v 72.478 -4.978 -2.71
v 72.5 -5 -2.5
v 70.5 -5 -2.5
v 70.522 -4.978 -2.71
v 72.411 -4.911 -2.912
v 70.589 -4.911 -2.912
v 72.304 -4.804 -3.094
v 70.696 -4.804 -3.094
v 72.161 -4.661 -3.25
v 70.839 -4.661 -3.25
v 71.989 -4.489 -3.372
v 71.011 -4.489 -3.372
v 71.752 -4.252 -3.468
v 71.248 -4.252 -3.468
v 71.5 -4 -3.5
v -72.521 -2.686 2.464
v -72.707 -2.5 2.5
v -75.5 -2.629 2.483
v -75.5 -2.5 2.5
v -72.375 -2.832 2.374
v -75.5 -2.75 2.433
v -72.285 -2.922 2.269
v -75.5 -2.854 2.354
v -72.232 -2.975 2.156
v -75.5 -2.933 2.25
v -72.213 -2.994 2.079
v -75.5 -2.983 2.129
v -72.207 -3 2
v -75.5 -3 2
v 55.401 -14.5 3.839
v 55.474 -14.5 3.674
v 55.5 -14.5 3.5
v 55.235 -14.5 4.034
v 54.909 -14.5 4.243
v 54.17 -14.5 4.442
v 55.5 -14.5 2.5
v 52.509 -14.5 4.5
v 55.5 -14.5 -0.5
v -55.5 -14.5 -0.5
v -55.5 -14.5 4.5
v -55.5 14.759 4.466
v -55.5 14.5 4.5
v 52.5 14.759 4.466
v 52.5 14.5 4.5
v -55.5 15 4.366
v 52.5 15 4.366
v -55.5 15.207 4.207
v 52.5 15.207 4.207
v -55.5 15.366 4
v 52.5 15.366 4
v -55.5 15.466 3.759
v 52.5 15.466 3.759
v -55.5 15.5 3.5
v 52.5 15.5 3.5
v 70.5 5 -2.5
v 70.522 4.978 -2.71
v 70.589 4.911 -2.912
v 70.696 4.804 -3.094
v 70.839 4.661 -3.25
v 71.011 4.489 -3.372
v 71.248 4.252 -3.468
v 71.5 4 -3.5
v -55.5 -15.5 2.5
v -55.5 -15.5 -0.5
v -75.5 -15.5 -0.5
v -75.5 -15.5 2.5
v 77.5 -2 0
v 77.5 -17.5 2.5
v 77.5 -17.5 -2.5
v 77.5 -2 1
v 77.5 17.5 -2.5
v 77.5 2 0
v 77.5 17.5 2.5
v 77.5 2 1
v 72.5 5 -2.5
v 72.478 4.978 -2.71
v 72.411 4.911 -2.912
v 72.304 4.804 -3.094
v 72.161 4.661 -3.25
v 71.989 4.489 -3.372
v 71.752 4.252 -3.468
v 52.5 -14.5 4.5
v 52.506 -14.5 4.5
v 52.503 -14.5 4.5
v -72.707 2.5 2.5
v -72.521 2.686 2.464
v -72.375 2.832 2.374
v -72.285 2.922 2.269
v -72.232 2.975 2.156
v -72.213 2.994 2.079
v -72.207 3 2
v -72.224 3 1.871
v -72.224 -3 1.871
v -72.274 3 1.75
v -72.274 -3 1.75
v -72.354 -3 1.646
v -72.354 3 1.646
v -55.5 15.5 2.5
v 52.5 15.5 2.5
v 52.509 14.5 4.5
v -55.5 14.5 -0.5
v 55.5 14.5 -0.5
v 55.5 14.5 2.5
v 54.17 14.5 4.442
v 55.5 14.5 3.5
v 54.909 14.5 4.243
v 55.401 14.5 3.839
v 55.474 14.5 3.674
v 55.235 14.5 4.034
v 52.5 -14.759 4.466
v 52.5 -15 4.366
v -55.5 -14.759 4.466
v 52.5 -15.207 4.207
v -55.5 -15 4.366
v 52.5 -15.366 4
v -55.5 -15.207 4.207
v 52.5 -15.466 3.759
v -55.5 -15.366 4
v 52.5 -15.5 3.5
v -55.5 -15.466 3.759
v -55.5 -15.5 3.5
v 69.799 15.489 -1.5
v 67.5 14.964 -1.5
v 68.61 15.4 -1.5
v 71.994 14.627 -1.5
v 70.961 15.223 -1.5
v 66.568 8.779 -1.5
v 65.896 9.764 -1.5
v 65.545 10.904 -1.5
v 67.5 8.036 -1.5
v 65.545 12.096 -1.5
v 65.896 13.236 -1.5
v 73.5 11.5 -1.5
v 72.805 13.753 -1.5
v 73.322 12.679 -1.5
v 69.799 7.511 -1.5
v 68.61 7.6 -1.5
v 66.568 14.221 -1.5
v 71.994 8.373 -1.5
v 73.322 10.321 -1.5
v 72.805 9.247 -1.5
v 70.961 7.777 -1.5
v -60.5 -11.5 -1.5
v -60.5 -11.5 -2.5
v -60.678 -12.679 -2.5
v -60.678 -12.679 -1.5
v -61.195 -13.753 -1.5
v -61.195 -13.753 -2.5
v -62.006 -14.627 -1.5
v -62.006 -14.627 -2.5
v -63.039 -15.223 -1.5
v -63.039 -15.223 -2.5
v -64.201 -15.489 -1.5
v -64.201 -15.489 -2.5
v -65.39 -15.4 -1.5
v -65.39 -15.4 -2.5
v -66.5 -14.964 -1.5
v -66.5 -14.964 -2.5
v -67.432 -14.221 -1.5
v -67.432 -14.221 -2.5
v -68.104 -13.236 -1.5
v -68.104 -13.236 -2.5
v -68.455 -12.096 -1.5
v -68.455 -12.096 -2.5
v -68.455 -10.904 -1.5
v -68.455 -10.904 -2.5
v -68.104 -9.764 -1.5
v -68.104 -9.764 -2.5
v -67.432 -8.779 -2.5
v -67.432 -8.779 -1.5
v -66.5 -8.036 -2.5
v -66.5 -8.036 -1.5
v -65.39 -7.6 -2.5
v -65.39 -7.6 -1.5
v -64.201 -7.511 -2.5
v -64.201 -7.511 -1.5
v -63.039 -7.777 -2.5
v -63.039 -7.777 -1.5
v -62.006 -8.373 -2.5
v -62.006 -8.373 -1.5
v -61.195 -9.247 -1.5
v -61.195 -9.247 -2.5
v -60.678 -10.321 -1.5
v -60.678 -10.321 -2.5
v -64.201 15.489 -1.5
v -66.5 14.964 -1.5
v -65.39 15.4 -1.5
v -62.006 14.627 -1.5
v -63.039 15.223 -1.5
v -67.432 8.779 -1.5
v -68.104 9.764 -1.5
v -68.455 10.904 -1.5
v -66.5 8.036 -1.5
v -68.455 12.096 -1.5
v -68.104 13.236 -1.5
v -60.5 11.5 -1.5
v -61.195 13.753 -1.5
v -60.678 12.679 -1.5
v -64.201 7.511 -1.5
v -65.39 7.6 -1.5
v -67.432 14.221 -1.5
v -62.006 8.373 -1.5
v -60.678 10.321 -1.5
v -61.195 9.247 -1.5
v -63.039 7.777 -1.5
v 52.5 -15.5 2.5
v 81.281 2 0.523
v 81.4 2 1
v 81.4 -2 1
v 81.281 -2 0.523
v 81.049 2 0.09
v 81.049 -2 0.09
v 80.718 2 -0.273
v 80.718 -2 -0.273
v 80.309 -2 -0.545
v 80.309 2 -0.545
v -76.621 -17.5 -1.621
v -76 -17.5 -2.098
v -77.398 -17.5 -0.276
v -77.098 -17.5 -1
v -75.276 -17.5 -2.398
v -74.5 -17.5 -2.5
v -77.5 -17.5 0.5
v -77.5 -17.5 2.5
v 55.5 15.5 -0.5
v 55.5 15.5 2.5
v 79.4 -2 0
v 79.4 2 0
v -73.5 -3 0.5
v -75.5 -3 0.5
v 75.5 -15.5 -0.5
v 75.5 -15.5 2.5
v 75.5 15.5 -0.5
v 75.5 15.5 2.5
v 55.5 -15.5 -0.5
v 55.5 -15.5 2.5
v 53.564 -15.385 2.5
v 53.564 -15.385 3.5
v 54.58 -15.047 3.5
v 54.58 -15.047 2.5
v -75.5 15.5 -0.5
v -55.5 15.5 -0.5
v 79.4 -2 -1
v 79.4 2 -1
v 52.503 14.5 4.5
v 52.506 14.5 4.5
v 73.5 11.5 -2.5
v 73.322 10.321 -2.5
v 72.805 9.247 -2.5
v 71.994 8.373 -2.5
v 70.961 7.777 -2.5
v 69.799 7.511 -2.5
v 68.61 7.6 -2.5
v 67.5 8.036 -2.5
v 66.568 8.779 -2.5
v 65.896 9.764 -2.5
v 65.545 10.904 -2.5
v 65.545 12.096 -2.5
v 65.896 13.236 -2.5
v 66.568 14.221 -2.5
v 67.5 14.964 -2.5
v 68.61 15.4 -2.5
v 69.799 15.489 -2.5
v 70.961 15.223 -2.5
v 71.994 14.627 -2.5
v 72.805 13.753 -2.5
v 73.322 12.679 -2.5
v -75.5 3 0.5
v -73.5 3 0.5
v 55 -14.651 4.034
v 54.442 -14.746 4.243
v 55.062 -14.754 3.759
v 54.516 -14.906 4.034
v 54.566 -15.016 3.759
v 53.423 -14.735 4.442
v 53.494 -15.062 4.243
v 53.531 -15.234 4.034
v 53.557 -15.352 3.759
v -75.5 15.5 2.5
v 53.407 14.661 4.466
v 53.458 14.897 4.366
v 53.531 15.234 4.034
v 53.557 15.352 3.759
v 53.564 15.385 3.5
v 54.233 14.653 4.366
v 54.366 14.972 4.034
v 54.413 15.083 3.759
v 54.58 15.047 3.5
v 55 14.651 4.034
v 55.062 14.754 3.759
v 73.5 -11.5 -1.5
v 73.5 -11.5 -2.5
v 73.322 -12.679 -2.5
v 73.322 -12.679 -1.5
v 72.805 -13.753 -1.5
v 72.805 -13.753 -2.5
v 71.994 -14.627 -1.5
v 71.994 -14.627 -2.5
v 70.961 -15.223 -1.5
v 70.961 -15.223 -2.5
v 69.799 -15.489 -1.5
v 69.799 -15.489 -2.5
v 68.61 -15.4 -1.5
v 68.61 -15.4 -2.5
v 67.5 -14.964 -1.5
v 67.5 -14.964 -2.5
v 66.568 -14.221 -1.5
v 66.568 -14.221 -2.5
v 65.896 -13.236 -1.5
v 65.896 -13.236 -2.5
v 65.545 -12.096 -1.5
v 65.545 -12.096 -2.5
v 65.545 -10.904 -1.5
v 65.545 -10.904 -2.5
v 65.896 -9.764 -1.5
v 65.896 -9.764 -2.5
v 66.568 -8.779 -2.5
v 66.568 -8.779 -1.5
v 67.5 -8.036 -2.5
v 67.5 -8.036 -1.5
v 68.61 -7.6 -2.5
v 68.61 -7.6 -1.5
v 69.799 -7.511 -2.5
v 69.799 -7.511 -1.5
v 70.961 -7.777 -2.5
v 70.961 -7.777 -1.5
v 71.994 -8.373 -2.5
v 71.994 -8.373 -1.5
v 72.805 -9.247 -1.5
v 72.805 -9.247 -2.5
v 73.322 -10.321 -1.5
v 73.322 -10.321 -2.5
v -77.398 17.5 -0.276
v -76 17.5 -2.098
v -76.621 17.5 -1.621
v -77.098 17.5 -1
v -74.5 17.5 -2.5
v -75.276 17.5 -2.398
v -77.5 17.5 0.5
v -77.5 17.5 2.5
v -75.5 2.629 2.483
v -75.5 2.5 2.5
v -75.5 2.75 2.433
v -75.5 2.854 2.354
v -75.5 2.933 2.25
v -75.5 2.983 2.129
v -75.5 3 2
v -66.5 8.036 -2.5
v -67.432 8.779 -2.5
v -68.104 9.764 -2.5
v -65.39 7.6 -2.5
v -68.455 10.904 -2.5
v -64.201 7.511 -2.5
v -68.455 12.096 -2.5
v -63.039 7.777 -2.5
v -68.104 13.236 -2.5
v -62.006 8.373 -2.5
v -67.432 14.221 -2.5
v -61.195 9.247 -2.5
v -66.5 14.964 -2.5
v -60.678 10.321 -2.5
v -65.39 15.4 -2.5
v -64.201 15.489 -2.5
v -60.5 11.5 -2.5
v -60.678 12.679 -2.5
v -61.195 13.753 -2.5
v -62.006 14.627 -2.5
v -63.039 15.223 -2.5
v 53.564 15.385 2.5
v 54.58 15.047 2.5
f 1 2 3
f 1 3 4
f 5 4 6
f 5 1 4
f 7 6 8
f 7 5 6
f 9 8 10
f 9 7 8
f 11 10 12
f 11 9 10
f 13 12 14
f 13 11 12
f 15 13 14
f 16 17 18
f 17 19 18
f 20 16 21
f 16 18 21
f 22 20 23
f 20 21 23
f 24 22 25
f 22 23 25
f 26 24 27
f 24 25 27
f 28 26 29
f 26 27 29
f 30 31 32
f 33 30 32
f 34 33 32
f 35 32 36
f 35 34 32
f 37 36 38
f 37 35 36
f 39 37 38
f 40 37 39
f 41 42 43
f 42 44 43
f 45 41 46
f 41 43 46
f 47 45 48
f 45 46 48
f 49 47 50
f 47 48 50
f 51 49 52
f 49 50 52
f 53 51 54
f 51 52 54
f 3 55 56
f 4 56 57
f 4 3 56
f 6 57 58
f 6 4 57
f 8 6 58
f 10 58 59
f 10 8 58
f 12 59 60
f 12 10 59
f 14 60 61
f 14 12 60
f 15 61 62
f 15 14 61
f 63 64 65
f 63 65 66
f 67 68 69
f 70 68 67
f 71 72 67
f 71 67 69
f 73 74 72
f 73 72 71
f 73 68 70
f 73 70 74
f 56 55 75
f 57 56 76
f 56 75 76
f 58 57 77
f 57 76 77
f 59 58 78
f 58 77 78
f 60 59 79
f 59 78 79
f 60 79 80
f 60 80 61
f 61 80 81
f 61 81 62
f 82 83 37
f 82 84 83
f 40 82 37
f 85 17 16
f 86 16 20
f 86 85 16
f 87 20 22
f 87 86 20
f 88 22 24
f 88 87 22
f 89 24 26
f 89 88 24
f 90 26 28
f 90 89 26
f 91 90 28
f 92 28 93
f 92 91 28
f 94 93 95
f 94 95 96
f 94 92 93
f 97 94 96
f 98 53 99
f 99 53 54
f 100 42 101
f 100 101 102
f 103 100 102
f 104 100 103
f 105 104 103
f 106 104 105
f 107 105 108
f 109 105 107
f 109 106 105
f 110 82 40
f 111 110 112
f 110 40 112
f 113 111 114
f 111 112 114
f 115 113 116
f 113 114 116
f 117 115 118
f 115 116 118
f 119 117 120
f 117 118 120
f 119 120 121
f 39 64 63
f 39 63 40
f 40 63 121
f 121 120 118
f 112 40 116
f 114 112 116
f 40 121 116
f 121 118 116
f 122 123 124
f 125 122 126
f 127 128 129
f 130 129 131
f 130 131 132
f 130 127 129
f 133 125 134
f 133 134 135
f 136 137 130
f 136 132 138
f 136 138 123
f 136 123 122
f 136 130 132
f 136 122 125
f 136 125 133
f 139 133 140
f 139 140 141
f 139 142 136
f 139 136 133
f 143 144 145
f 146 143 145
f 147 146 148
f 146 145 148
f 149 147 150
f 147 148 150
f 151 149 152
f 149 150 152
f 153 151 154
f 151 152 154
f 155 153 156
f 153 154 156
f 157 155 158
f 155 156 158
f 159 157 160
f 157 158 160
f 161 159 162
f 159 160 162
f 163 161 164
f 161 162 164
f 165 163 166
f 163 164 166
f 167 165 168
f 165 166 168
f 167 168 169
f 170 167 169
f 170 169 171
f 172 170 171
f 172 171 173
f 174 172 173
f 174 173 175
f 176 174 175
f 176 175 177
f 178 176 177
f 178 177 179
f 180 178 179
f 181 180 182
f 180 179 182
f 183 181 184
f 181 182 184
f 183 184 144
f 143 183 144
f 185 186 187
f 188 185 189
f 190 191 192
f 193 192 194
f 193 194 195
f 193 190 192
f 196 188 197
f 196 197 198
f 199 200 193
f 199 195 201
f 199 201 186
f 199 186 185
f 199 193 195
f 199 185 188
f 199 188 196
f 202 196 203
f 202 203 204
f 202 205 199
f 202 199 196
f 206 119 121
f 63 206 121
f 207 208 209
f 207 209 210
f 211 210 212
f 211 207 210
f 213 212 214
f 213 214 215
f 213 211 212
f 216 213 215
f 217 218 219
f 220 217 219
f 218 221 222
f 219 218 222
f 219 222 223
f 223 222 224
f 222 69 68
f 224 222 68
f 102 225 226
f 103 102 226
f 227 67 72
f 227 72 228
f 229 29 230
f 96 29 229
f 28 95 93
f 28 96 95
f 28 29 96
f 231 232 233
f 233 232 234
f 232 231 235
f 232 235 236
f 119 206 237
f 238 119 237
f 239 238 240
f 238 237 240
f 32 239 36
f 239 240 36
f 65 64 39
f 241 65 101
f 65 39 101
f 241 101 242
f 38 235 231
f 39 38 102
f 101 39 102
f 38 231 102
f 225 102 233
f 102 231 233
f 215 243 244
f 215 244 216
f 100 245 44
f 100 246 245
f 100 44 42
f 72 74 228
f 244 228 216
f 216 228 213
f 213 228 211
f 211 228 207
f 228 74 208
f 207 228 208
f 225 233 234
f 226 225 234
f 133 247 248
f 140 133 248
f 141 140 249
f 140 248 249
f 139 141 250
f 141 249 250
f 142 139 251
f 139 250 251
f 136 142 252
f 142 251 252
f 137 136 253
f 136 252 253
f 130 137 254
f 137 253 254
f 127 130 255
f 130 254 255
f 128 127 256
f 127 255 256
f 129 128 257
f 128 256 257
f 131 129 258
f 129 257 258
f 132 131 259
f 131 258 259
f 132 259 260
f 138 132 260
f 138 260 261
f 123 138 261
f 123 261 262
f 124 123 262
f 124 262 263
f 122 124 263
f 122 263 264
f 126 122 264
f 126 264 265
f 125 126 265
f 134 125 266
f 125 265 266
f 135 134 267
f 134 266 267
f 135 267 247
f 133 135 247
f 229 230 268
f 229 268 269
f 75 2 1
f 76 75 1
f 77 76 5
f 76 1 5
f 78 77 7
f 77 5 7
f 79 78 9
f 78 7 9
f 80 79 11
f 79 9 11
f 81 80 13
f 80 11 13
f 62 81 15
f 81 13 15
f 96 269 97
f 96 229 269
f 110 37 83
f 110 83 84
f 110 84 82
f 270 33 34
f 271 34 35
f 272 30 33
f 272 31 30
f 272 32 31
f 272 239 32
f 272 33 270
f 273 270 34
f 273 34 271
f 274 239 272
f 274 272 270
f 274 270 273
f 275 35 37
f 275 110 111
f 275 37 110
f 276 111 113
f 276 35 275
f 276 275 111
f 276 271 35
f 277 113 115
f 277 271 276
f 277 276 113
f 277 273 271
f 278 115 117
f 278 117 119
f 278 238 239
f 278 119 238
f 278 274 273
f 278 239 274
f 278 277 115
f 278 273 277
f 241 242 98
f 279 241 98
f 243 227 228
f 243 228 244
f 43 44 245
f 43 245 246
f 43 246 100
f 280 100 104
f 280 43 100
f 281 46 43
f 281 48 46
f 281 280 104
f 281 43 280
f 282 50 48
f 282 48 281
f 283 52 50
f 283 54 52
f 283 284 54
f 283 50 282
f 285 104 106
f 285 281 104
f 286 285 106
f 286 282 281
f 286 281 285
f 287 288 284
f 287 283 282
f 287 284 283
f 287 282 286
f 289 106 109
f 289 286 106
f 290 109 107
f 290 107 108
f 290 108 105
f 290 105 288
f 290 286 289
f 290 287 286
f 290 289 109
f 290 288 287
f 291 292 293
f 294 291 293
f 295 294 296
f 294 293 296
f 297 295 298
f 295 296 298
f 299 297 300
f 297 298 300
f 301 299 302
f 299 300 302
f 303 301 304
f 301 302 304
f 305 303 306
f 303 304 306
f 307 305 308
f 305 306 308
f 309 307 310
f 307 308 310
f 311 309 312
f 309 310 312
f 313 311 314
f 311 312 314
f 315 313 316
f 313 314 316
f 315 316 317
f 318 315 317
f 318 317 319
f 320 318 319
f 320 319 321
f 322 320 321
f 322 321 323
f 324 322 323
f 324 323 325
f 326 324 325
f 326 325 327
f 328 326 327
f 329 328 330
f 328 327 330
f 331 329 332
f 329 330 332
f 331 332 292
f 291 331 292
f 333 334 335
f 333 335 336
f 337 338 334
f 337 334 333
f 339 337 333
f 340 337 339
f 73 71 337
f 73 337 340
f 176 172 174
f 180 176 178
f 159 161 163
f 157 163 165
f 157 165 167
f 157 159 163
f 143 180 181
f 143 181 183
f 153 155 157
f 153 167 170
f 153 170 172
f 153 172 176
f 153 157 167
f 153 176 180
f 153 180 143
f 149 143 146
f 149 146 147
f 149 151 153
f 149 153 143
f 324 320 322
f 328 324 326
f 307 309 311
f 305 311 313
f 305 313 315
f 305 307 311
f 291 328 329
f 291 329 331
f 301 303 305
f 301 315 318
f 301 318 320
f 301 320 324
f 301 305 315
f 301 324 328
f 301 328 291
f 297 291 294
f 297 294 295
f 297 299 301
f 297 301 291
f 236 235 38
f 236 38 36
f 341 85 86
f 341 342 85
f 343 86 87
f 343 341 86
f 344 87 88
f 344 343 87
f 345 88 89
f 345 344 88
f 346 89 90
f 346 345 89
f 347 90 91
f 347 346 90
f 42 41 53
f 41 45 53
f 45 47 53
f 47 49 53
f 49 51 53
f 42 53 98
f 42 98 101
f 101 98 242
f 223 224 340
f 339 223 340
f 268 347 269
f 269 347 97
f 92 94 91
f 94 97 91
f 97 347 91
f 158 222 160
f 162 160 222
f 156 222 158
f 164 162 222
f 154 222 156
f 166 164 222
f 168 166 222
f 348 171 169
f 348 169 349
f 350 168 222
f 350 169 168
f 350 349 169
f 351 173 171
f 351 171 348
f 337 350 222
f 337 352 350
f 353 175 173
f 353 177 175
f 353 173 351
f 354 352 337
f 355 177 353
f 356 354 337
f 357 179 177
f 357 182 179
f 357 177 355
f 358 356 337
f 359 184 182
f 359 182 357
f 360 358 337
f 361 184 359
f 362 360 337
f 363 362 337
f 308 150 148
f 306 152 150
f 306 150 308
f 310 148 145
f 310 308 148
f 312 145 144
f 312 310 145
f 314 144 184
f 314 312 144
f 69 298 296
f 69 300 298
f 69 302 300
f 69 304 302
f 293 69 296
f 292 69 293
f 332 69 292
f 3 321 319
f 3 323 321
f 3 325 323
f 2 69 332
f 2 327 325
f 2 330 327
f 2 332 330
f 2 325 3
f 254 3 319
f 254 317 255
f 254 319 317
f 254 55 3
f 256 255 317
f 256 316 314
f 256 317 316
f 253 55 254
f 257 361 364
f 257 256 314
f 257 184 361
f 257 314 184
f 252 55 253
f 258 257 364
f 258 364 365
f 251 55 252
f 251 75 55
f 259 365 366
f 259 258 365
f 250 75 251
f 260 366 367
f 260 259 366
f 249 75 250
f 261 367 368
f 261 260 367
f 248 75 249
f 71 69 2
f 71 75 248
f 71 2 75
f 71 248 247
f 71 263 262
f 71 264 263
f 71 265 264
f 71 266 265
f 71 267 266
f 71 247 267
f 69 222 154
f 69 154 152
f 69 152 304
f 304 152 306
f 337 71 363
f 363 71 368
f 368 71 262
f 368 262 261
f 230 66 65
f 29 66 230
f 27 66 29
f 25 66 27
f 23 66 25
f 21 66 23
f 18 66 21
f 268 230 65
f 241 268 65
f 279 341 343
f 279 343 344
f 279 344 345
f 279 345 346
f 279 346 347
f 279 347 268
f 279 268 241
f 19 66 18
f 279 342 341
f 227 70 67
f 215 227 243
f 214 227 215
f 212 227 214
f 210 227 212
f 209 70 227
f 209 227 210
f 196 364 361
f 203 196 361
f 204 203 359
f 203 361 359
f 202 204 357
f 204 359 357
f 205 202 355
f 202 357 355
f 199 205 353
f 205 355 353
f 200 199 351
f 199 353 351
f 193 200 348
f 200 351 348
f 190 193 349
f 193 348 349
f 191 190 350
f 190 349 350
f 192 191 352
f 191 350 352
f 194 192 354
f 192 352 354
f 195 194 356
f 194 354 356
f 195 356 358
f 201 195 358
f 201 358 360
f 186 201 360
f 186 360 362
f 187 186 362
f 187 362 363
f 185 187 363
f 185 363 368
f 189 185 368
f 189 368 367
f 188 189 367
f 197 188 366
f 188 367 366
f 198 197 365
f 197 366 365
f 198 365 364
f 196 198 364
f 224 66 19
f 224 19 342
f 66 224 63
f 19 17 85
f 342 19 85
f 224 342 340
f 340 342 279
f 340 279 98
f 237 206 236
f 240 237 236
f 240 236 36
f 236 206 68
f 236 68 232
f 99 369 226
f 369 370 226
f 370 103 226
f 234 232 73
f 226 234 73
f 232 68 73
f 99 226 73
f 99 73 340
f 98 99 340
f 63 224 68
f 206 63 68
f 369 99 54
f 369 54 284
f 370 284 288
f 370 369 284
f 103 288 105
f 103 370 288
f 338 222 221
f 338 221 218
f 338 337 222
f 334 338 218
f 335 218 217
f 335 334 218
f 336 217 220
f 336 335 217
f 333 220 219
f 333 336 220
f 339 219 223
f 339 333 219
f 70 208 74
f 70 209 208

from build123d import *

# Parameters (mm, degrees)
F0_W         = 35
F0_H         = 5
F1_DEPTH     = 77.5
F2_T         = -2
F4_DEPTH     = 3
F6_DEPTH     = 2
F7_T1_DEPTH  = 10.0971618345
F8_W         = 111
F8_H         = 5
F9_DEPTH     = 1
F10_W        = 111
F10_H        = 2
F10_H_2      = 3
F11_DEPTH    = 1
F12_T1_DEPTH = 9.5
F13_R        = 0.99999
F14_R        = 0.5
F15_R        = 4
F16_DEPTH    = 1
F17_W        = 2
F17_H        = 10
F18_DEPTH    = 1
F19_R        = 0.99999
F20_R        = 3


# Not quite as in the source:
# - a fillet or chamfer that OpenCascade refuses, or shapes differently, is made with other operations: its cross-section is extruded or revolved along the edge and cut away or added
# - a fillet or chamfer is up to 0.001 mm smaller than in the source, because OpenCascade refuses the exact size


with BuildPart() as f1:
    # F0 (on Right) → F1 (new body, symmetric)
    with BuildSketch(Plane.YZ):
        Rectangle(F0_W, F0_H)
    extrude(amount=F1_DEPTH, both=True)

    # F2
    f2_openings = [f1.faces().sort_by_distance(p)[0] for p in [
        (0, 0, 2.5),
    ]]
    offset(amount=F2_T, openings=f2_openings)

    # F3 (on Front) → F4 (join, symmetric)
    with BuildSketch(Plane.XZ):
        Polygon((-71.5, 2.5), (-75.5, 2.5), (-75.5, 0.5), (-73.5, 0.5), align=None)
    extrude(amount=F4_DEPTH, both=True)

    # F5 (on Front) → F6 (join, symmetric)
    with BuildSketch(Plane.XZ):
        Polygon((81.4, 1), (77.5, 1), (77.5, 0), (79.4, 0), (81.4, 0), align=None)
        Polygon((79.4, -1), (81.4, 0), (79.4, 0), align=None)
    extrude(amount=F6_DEPTH, both=True)

    # F7: fillet of radius 2 on 1 edges, made by hand

    # F7_s2 → F7_t1 (cut)
    with BuildSketch(Plane.XZ.offset(-5.0485809173)):
        with BuildLine():
            ThreePointArc((81.4, 1), (81.0488845703, 0.09023972), (80.3093065335, -0.5453467333))
            Line((80.3093065335, -0.5453467333), (81.4, 0))
            Line((81.4, 0), (81.4, 1))
        make_face()
    extrude(amount=F7_T1_DEPTH, mode=Mode.SUBTRACT)

    # F8 (on face) → F9 (join)
    with BuildSketch(Plane(origin=(0, -15.5, 0), x_dir=(-1, 0, 0), z_dir=(0, 1, 0))):
        with Locations((0, 2)):
            Rectangle(F8_W, F8_H)
    extrude(amount=F9_DEPTH)

    # F10 (on face) → F11 (join)
    with BuildSketch(Plane.XZ.offset(-15.5)):
        with Locations((0, 3.5)):
            Rectangle(F10_W, F10_H)
        with Locations((0, 1)):
            Rectangle(F10_W, F10_H_2)
    extrude(amount=F11_DEPTH)

    # F12: fillet of radius 5 on 2 edges, made by hand

    # F12_s2 → F12_t1 (cut)
    with BuildSketch(Plane.XY.offset(2.5)):
        with BuildLine():
            ThreePointArc((52.5, 15.5), (54.0811388301, 15.2434164903), (55.5, 14.5))
            Line((55.5, 14.5), (55.5, 15.5))
            Line((55.5, 15.5), (52.5, 15.5))
        make_face()
        with BuildLine():
            ThreePointArc((52.5, -15.5), (54.0811388301, -15.2434164903), (55.5, -14.5))
            Line((55.5, -14.5), (55.5, -15.5))
            Line((55.5, -15.5), (52.5, -15.5))
        make_face()
    extrude(amount=F12_T1_DEPTH, mode=Mode.SUBTRACT)

    # F13 (radius 1 in the source; OpenCascade refuses exactly that, so slightly less here)
    f13_edges = [f1.edges().sort_by_distance(p)[0] for p in [
        (-1.5, -15.5, 4.5),
        (-1.5, 15.5, 4.5),
    ]]
    fillet(f13_edges, radius=F13_R)

    # F14
    f14_edges = [f1.edges().sort_by_distance(p)[0] for p in [
        (-71.5, 0, 2.5),
        (-73.5, -3, 2.5),
        (-73.5, 3, 2.5),
    ]]
    fillet(f14_edges, radius=F14_R)

    # F15 (on face) → F16 (cut)
    with BuildSketch(Plane(origin=(0, 0, -2.5), x_dir=(1, 0, 0), z_dir=(0, 0, -1))):
        with Locations((-64.5, 11.5)):
            Circle(F15_R)
        with Locations((-64.5, -11.5)):
            Circle(F15_R)
        with Locations((69.5, -11.5)):
            Circle(F15_R)
        with Locations((69.5, 11.5)):
            Circle(F15_R)
    extrude(amount=-F16_DEPTH, mode=Mode.SUBTRACT)

    # F17 (on face) → F18 (join)
    with BuildSketch(Plane(origin=(0, 0, -2.5), x_dir=(1, 0, 0), z_dir=(0, 0, -1))):
        with Locations((71.5, 0)):
            Rectangle(F17_W, F17_H)
    extrude(amount=F18_DEPTH)

    # F19 (radius 1 in the source; OpenCascade refuses exactly that, so slightly less here)
    f19_edges = [f1.edges().sort_by_distance(p)[0] for p in [
        (71.5, -5, -3.5),
        (72.5, 0, -3.5),
        (71.5, 5, -3.5),
        (70.5, 0, -3.5),
    ]]
    fillet(f19_edges, radius=F19_R)

    # F20
    f20_edges = [f1.edges().sort_by_distance(p)[0] for p in [
        (-77.5, 0, -2.5),
    ]]
    fillet(f20_edges, radius=F20_R)


solid = f1.part
